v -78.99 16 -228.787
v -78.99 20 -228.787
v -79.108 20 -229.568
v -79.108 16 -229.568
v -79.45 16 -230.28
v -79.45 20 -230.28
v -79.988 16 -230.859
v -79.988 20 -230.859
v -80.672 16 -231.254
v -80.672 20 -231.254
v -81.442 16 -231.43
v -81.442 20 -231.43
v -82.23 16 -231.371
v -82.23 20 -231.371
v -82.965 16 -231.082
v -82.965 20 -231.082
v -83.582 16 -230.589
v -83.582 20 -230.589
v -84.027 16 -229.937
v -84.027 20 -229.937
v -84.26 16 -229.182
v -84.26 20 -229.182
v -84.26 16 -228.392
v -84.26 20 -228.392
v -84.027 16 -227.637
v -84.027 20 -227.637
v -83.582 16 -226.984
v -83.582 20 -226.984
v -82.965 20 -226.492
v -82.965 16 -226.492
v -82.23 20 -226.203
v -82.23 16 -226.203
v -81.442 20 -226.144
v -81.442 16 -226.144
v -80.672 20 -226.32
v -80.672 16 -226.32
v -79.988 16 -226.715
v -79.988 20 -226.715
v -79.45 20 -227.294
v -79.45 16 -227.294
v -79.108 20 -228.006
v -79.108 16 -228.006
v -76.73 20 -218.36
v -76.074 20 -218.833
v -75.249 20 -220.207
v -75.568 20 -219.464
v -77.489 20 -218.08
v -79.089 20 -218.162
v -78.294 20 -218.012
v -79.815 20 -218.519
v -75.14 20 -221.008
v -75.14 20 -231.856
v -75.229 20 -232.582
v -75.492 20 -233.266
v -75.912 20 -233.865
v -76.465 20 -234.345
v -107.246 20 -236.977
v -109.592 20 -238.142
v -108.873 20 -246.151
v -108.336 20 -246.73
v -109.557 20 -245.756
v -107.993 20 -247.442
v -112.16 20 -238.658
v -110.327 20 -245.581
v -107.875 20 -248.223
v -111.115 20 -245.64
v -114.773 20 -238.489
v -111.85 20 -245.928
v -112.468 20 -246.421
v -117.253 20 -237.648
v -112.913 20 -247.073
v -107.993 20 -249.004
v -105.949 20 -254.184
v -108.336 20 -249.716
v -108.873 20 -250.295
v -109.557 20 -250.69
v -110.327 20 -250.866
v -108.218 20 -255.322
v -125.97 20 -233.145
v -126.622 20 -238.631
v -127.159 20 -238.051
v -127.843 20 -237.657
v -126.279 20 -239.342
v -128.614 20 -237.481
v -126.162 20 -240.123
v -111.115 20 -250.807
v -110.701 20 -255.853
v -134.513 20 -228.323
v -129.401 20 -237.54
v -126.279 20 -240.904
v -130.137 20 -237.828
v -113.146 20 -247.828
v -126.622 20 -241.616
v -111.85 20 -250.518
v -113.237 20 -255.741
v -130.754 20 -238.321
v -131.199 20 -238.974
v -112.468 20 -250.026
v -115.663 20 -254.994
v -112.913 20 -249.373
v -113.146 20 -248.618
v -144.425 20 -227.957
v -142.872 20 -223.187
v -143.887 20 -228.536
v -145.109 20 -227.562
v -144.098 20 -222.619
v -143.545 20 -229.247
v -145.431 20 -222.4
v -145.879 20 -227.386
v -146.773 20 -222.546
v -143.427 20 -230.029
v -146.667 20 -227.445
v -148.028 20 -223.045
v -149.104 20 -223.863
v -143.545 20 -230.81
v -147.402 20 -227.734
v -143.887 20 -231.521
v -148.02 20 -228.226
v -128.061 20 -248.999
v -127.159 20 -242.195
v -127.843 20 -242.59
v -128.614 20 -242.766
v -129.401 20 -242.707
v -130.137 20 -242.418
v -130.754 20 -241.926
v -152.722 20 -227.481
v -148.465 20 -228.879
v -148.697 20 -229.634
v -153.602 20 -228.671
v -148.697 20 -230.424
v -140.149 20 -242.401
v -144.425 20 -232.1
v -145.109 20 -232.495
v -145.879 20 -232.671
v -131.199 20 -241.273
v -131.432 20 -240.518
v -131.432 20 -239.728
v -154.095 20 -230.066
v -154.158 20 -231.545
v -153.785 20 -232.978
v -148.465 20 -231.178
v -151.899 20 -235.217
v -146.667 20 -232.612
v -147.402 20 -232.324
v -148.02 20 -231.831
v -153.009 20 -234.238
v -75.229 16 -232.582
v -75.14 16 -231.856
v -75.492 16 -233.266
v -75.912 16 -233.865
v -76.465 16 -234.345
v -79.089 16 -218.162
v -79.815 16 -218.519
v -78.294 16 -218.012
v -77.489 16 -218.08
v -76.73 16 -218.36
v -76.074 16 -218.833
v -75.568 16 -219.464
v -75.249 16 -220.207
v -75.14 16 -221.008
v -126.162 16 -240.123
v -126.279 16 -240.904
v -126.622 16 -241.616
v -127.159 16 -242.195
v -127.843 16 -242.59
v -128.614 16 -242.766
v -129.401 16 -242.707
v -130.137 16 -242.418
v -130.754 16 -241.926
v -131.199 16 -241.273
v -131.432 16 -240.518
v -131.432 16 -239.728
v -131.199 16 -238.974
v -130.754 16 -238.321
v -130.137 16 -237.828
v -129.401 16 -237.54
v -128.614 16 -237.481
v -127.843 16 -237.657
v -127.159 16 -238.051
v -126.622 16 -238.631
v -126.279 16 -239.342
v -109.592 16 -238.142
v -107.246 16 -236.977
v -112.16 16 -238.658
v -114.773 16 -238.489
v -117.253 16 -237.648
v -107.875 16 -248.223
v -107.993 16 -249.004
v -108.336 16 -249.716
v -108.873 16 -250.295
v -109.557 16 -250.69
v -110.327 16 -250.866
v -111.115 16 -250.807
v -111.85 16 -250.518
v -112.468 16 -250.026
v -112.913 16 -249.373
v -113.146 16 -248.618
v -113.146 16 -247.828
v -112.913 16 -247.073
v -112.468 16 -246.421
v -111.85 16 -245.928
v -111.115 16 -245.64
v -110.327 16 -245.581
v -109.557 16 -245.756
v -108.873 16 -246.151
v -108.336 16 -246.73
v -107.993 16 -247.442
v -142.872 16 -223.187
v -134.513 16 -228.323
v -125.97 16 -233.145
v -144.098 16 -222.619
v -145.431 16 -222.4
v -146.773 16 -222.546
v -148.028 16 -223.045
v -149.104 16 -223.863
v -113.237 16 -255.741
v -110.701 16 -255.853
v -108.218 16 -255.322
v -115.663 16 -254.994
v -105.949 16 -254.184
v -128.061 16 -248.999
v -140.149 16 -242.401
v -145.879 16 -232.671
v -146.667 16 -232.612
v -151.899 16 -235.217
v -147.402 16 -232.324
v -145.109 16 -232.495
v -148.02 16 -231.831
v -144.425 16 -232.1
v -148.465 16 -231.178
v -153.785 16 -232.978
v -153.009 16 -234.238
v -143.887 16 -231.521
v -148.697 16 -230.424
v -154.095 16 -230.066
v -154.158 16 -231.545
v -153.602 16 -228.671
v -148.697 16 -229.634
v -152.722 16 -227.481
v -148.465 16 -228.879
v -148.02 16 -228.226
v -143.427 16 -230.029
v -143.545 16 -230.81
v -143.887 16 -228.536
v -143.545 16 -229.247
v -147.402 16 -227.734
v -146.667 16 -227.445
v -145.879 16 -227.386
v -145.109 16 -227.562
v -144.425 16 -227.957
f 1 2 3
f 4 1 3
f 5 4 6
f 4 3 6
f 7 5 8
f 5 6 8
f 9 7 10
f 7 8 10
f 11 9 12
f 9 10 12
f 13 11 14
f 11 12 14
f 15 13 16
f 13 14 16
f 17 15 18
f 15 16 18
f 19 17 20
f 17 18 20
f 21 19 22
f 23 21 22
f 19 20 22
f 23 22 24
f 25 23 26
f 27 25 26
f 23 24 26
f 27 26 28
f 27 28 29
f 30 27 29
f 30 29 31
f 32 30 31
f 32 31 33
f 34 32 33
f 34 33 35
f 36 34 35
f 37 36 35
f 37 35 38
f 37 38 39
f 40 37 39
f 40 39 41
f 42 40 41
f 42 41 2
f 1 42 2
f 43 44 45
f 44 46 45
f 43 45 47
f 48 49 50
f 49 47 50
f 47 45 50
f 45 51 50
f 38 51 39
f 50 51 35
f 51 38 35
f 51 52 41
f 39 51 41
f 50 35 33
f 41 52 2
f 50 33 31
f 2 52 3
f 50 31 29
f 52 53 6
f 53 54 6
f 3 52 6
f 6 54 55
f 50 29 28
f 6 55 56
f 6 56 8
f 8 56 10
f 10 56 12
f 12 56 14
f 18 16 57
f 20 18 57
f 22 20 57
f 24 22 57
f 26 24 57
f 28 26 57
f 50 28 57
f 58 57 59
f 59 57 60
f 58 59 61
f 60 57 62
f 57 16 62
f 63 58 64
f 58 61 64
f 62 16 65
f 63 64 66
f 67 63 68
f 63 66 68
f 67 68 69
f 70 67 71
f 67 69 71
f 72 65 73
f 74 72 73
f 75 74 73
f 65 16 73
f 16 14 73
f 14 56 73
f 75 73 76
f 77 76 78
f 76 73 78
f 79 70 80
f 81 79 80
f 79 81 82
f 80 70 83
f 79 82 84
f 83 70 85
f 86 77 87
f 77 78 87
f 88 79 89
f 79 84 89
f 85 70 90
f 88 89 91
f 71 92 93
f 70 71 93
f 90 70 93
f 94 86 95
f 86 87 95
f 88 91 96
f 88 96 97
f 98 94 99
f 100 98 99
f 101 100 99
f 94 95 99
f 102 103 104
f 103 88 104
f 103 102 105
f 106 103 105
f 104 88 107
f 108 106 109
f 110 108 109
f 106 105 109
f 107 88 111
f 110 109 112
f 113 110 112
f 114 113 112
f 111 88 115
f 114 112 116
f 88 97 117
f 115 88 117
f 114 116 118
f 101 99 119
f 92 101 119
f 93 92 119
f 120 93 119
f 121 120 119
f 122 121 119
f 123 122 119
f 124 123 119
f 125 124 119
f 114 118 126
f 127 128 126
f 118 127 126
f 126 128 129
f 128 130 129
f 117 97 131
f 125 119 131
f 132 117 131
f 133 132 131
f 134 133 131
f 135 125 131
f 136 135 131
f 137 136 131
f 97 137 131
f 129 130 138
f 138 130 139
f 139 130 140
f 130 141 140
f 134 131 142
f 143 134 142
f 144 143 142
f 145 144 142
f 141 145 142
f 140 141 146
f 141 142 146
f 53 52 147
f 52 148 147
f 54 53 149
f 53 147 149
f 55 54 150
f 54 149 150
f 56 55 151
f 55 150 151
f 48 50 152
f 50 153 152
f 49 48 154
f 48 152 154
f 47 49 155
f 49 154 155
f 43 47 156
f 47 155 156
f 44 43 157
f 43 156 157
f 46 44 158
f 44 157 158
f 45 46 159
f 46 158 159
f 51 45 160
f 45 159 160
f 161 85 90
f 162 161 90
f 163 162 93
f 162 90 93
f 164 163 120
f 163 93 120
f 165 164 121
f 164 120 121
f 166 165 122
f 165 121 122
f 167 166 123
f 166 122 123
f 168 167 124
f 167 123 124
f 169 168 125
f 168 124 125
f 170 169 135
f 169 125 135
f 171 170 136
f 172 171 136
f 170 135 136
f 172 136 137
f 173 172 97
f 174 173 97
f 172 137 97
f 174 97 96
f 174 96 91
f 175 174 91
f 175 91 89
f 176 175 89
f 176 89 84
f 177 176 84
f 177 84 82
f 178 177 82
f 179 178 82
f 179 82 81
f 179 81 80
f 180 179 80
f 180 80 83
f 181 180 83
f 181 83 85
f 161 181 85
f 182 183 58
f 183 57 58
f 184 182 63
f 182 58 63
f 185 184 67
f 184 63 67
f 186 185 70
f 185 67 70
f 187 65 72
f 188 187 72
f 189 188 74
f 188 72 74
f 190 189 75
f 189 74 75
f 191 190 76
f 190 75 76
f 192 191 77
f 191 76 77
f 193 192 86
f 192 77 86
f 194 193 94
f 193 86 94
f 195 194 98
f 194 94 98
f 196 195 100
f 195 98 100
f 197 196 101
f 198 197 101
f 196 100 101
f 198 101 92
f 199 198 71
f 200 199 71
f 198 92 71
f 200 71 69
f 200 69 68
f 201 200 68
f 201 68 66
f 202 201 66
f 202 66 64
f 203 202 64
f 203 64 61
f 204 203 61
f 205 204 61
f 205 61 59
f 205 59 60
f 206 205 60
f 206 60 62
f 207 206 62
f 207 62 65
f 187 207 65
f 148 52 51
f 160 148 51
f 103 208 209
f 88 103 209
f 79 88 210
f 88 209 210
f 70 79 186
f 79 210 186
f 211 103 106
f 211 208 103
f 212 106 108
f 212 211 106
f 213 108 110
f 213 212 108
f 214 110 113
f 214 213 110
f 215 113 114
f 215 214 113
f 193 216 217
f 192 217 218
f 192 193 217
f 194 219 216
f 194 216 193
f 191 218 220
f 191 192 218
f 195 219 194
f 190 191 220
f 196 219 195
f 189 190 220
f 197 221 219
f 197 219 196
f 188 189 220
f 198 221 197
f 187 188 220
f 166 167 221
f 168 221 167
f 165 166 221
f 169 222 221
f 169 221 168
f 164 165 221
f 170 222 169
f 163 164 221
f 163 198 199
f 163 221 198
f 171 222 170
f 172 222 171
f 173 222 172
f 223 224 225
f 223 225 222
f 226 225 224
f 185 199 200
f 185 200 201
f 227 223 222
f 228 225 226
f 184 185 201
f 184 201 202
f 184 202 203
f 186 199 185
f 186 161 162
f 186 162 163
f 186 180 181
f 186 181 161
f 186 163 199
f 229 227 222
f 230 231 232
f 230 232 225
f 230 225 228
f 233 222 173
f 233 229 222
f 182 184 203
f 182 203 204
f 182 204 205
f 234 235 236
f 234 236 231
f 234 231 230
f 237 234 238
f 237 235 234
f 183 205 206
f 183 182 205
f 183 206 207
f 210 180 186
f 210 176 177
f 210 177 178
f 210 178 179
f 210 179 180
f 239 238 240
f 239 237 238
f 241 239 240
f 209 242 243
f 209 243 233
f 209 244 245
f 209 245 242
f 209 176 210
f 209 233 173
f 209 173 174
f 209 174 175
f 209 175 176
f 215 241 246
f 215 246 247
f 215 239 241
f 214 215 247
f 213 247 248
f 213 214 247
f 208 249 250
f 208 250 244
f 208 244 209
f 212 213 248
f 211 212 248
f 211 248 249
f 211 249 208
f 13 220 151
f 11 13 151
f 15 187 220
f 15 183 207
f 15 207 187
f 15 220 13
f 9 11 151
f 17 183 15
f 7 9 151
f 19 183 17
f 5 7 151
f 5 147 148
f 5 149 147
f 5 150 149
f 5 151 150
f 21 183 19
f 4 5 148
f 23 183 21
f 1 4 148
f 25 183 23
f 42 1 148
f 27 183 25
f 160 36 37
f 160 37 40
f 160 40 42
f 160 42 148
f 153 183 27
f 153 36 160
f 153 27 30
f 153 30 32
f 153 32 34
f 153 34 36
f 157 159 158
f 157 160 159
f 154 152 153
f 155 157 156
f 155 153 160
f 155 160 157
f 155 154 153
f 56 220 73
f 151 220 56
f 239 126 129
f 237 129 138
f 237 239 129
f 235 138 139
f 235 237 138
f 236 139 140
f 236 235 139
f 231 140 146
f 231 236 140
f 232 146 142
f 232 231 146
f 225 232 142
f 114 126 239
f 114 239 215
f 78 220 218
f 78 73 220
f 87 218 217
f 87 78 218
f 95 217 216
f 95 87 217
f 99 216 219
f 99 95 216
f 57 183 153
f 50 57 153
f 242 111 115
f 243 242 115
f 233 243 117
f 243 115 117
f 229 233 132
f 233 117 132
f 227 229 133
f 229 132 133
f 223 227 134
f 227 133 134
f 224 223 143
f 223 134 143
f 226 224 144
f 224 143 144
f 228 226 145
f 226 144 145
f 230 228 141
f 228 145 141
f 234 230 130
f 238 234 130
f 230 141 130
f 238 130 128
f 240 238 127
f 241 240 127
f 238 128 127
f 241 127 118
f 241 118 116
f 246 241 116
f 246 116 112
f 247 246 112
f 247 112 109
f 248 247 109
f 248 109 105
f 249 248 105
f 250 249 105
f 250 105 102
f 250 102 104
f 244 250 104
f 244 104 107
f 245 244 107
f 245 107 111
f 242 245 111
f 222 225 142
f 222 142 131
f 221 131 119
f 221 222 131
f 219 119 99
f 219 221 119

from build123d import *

# Parameters (mm, degrees)
SKETCH_1_R               = 275
SKETCH_1_R_2             = 255
EXTRUDE_1_DEPTH          = 10
EXTRUDE_2_DEPTH          = 10
SKETCH_8_R               = 2.65
CUT_EXTRUDE_1_DEPTH      = 21
SKETCH_9_OUTSIDE_W       = 707.614
SKETCH_9_OUTSIDE_H       = 707.614
CUT_EXTRUDE_2_DEPTH      = 21
SKETCH_10_W              = 90.654248201
SKETCH_10_H              = 12
CUT_EXTRUDE_3_DEPTH      = 519.420037555
CUT_EXTRUDE_3_DEPTH_BACK = 245.939436413
FILLET_1_R               = 3
FILLET_2_R               = 10
FILLET_3_R               = 5
SKETCH_11_W              = 550
SKETCH_11_H              = 20
CUT_EXTRUDE_4_DEPTH      = 519.420037555
CUT_EXTRUDE_4_DEPTH_BACK = 245.939436413
CUT_EXTRUDE_5_DEPTH      = 11
FILLET_4_R               = 3


with BuildPart() as part:
    # 草图1 → 凸台-拉伸1 (new body)
    with BuildSketch(Plane(origin=(0, 0, 0), x_dir=(1, 0, 0), z_dir=(0, 1, 0))):
        Circle(SKETCH_1_R)
        Circle(SKETCH_1_R_2, mode=Mode.SUBTRACT)
    extrude(amount=EXTRUDE_1_DEPTH)

    # 草图11 → 切除-拉伸4 (cut, two sides)
    with BuildSketch(Plane(origin=(76.33674701, 0, -113.448714652), x_dir=(0.829665535, 0, 0.558260781), z_dir=(-0.558260781, 0, 0.829665535))) as cut_extrude_4_sk:
        Rectangle(SKETCH_11_W, SKETCH_11_H)
    extrude(amount=CUT_EXTRUDE_4_DEPTH, mode=Mode.SUBTRACT)
    extrude(cut_extrude_4_sk.sketch, amount=-CUT_EXTRUDE_4_DEPTH_BACK, mode=Mode.SUBTRACT)


with BuildPart() as body_2:
    # 草图2 → 凸台-拉伸2 (new body)
    with BuildSketch(Plane(origin=(0, 10, 0), x_dir=(1, 0, 0), z_dir=(0, 1, 0))):
        with BuildLine():
            Line((-110.525139894, 257.262887824), (-25.423255477, 200))
            Line((-25.423255477, 200), (0, 200))
            Line((0, 200), (25.423255477, 200))
            Line((25.423255477, 200), (110.525139894, 257.262887824))
            ThreePointArc((110.525139894, 257.262887824), (197.989898732, 197.989898732), (257.262887824, 110.525139894))
            Line((257.262887824, 110.525139894), (200, 25.423255477))
            Line((200, 25.423255477), (200, 0))
            Line((200, 0), (200, -25.423255477))
            Line((200, -25.423255477), (257.262887824, -110.525139894))
            ThreePointArc((257.262887824, -110.525139894), (197.989898732, -197.989898732), (110.525139894, -257.262887824))
            Line((110.525139894, -257.262887824), (25.423255477, -200))
            Line((25.423255477, -200), (0, -200))
            Line((0, -200), (-25.423255477, -200))
            Line((-25.423255477, -200), (-110.525139894, -257.262887824))
            ThreePointArc((-110.525139894, -257.262887824), (-197.989898732, -197.989898732), (-257.262887824, -110.525139894))
            Line((-257.262887824, -110.525139894), (-200, -25.423255477))
            Line((-200, -25.423255477), (-200, 25.423255477))
            Line((-200, 25.423255477), (-257.262887824, 110.525139894))
            ThreePointArc((-257.262887824, 110.525139894), (-197.989898732, 197.989898732), (-110.525139894, 257.262887824))
        make_face()
        with BuildLine():
            Line((0, 185), (30, 185))
            Line((30, 185), (111.993839361, 240.171563565))
            ThreePointArc((111.993839361, 240.171563565), (187.383297014, 187.383297014), (240.171563565, 111.993839361))
            Line((240.171563565, 111.993839361), (185, 30))
            Line((185, 30), (185, 0))
            Line((185, 0), (185, -30))
            Line((185, -30), (240.171563565, -111.993839361))
            ThreePointArc((240.171563565, -111.993839361), (187.383297014, -187.383297014), (111.993839361, -240.171563565))
            Line((111.993839361, -240.171563565), (30, -185))
            Line((30, -185), (0, -185))
            Line((0, -185), (-30, -185))
            Line((-30, -185), (-111.993839361, -240.171563565))
            ThreePointArc((-111.993839361, -240.171563565), (-187.383297014, -187.383297014), (-240.171563565, -111.993839361))
            Line((-240.171563565, -111.993839361), (-185, -30))
            Line((-185, -30), (-185, 30))
            Line((-185, 30), (-240.171563565, 111.993839361))
            ThreePointArc((-240.171563565, 111.993839361), (-187.383297014, 187.383297014), (-111.993839361, 240.171563565))
            Line((-111.993839361, 240.171563565), (-30, 185))
            Line((-30, 185), (0, 185))
        make_face(mode=Mode.SUBTRACT)
    extrude(amount=EXTRUDE_2_DEPTH)

    # 草图8 → 切除-拉伸1 (cut, through all)
    with BuildSketch(Plane(origin=(0, 20, 0), x_dir=(1, 0, 0), z_dir=(0, 1, 0))):
        with Locations((-10, 192.5)):
            Circle(SKETCH_8_R)
        with Locations((10, 192.5)):
            Circle(SKETCH_8_R)
        with Locations((-10, -192.5)):
            Circle(SKETCH_8_R)
        with Locations((10, -192.5)):
            Circle(SKETCH_8_R)
        with Locations((192.5, 10)):
            Circle(SKETCH_8_R)
        with Locations((192.5, -10)):
            Circle(SKETCH_8_R)
        with Locations((-192.5, 10)):
            Circle(SKETCH_8_R)
        with Locations((-192.5, -10)):
            Circle(SKETCH_8_R)
        with Locations((-110.525139894, 248.223100485)):
            Circle(SKETCH_8_R)
        with Locations((-27.711627738, 192.5)):
            Circle(SKETCH_8_R)
        with Locations((-44.304938442, 203.665215623)):
            Circle(SKETCH_8_R)
        with Locations((-56.749921469, 212.03912734)):
            Circle(SKETCH_8_R)
        with Locations((-69.194904497, 220.413039057)):
            Circle(SKETCH_8_R)
        with Locations((-81.639887524, 228.786950774)):
            Circle(SKETCH_8_R)
        with Locations((-146.077022117, 230.028561882)):
            Circle(SKETCH_8_R)
        with Locations((-164.415519771, 217.299729706)):
            Circle(SKETCH_8_R)
        with Locations((-183.638937552, 201.316607082)):
            Circle(SKETCH_8_R)
        with Locations((-201.316607082, 183.638937552)):
            Circle(SKETCH_8_R)
        with Locations((-217.299729706, 164.415519771)):
            Circle(SKETCH_8_R)
        with Locations((-230.028561882, 146.077022117)):
            Circle(SKETCH_8_R)
        with Locations((-128.811575358, 240.123330241)):
            Circle(SKETCH_8_R)
        with Locations((-240.123330241, 128.811575358)):
            Circle(SKETCH_8_R)
        with Locations((-228.786950774, 81.639887524)):
            Circle(SKETCH_8_R)
        with Locations((-220.413039057, 69.194904497)):
            Circle(SKETCH_8_R)
        with Locations((-212.03912734, 56.749921469)):
            Circle(SKETCH_8_R)
        with Locations((-203.665215623, 44.304938442)):
            Circle(SKETCH_8_R)
        with Locations((-192.5, 27.711627738)):
            Circle(SKETCH_8_R)
        with Locations((-248.223100485, 110.525139894)):
            Circle(SKETCH_8_R)
        with Locations((192.5, 27.711627738)):
            Circle(SKETCH_8_R)
        with Locations((248.223100485, 110.525139894)):
            Circle(SKETCH_8_R)
        with Locations((203.665215623, 44.304938442)):
            Circle(SKETCH_8_R)
        with Locations((212.03912734, 56.749921469)):
            Circle(SKETCH_8_R)
        with Locations((220.413039057, 69.194904497)):
            Circle(SKETCH_8_R)
        with Locations((228.786950774, 81.639887524)):
            Circle(SKETCH_8_R)
        with Locations((240.123330241, 128.811575358)):
            Circle(SKETCH_8_R)
        with Locations((230.028561882, 146.077022117)):
            Circle(SKETCH_8_R)
        with Locations((128.811575358, 240.123330241)):
            Circle(SKETCH_8_R)
        with Locations((201.316607082, 183.638937552)):
            Circle(SKETCH_8_R)
        with Locations((183.638937552, 201.316607082)):
            Circle(SKETCH_8_R)
        with Locations((164.415519771, 217.299729706)):
            Circle(SKETCH_8_R)
        with Locations((146.077022117, 230.028561882)):
            Circle(SKETCH_8_R)
        with Locations((81.639887524, 228.786950774)):
            Circle(SKETCH_8_R)
        with Locations((69.194904497, 220.413039057)):
            Circle(SKETCH_8_R)
        with Locations((56.749921469, 212.03912734)):
            Circle(SKETCH_8_R)
        with Locations((44.304938442, 203.665215623)):
            Circle(SKETCH_8_R)
        with Locations((110.525139894, 248.223100485)):
            Circle(SKETCH_8_R)
        with Locations((27.711627738, 192.5)):
            Circle(SKETCH_8_R)
        with Locations((217.299729706, 164.415519771)):
            Circle(SKETCH_8_R)
    extrude(amount=-CUT_EXTRUDE_1_DEPTH, mode=Mode.SUBTRACT)

    # 草图9 outside → 切除-拉伸2 (cut, through all)
    with BuildSketch(Plane(origin=(0, 20, 0), x_dir=(1, 0, 0), z_dir=(0, 1, 0))):
        Rectangle(SKETCH_9_OUTSIDE_W, SKETCH_9_OUTSIDE_H)
        with BuildLine():
            Line((-157.049761777, 231.808913387), (-146.237600169, 220.996751779))
            ThreePointArc((-146.237600169, 220.996751779), (-129.47118383, 231.218971016), (-111.993839361, 240.171563565))
            Line((-111.993839361, 240.171563565), (-64.194904497, 208.008879225))
            Line((-64.194904497, 208.008879225), (-64.194904497, 226.088453902))
            Line((-64.194904497, 226.088453902), (-110.525139894, 257.262887824))
            ThreePointArc((-110.525139894, 257.262887824), (-134.391436501, 245.639861983), (-157.049761777, 231.808913387))
        make_face(mode=Mode.SUBTRACT)
    extrude(amount=-CUT_EXTRUDE_2_DEPTH, mode=Mode.SUBTRACT)

    # 草图10 → 切除-拉伸3 (cut, two sides)
    with BuildSketch(Plane(origin=(76.33674701, 0, -113.448714652), x_dir=(0.829665535, 0, 0.558260781), z_dir=(-0.558260781, 0, 0.829665535))) as cut_extrude_3_sk:
        with Locations((-226.995793353, 10)):
            Rectangle(SKETCH_10_W, SKETCH_10_H)
    extrude(amount=CUT_EXTRUDE_3_DEPTH, mode=Mode.SUBTRACT)
    extrude(cut_extrude_3_sk.sketch, amount=-CUT_EXTRUDE_3_DEPTH_BACK, mode=Mode.SUBTRACT)

    # 圆角1
    fillet_1_edges = [body_2.edges().sort_by_distance(p)[0] for p in [
        (-64.194904497, 15, -208.008879225),
    ]]
    fillet(fillet_1_edges, radius=FILLET_1_R)

    # 圆角2
    fillet_2_edges = [body_2.edges().sort_by_distance(p)[0] for p in [
        (-110.525139894, 18, -257.262887824),
        (-111.993839361, 18, -240.171563565),
    ]]
    fillet(fillet_2_edges, radius=FILLET_2_R)

    # 圆角3
    fillet_3_edges = [body_2.edges().sort_by_distance(p)[0] for p in [
        (-157.049761777, 18, -231.808913387),
        (-146.237600169, 18, -220.996751779),
        (-64.194904497, 15, -226.088453902),
    ]]
    fillet(fillet_3_edges, radius=FILLET_3_R)

    # 草图12 → 切除-拉伸5 (cut, through all)
    with BuildSketch(Plane(origin=(0, 20, 0), x_dir=(1, 0, 0), z_dir=(0, 1, 0))):
        Polygon((-75.139887524, 233.453053871), (-75.139887524, 215.373479194), (-74.80041279, 205.67344135), (-60.747401583, 205.67344135), (-60.747401583, 233.453053871), align=None)
    extrude(amount=-CUT_EXTRUDE_5_DEPTH, mode=Mode.SUBTRACT)

    # 圆角4
    fillet_4_edges = [body_2.edges().sort_by_distance(p)[0] for p in [
        (-75.139887524, 18, -215.373479194),
        (-75.139887524, 18, -233.453053871),
    ]]
    fillet(fillet_4_edges, radius=FILLET_4_R)


solid = body_2.part
